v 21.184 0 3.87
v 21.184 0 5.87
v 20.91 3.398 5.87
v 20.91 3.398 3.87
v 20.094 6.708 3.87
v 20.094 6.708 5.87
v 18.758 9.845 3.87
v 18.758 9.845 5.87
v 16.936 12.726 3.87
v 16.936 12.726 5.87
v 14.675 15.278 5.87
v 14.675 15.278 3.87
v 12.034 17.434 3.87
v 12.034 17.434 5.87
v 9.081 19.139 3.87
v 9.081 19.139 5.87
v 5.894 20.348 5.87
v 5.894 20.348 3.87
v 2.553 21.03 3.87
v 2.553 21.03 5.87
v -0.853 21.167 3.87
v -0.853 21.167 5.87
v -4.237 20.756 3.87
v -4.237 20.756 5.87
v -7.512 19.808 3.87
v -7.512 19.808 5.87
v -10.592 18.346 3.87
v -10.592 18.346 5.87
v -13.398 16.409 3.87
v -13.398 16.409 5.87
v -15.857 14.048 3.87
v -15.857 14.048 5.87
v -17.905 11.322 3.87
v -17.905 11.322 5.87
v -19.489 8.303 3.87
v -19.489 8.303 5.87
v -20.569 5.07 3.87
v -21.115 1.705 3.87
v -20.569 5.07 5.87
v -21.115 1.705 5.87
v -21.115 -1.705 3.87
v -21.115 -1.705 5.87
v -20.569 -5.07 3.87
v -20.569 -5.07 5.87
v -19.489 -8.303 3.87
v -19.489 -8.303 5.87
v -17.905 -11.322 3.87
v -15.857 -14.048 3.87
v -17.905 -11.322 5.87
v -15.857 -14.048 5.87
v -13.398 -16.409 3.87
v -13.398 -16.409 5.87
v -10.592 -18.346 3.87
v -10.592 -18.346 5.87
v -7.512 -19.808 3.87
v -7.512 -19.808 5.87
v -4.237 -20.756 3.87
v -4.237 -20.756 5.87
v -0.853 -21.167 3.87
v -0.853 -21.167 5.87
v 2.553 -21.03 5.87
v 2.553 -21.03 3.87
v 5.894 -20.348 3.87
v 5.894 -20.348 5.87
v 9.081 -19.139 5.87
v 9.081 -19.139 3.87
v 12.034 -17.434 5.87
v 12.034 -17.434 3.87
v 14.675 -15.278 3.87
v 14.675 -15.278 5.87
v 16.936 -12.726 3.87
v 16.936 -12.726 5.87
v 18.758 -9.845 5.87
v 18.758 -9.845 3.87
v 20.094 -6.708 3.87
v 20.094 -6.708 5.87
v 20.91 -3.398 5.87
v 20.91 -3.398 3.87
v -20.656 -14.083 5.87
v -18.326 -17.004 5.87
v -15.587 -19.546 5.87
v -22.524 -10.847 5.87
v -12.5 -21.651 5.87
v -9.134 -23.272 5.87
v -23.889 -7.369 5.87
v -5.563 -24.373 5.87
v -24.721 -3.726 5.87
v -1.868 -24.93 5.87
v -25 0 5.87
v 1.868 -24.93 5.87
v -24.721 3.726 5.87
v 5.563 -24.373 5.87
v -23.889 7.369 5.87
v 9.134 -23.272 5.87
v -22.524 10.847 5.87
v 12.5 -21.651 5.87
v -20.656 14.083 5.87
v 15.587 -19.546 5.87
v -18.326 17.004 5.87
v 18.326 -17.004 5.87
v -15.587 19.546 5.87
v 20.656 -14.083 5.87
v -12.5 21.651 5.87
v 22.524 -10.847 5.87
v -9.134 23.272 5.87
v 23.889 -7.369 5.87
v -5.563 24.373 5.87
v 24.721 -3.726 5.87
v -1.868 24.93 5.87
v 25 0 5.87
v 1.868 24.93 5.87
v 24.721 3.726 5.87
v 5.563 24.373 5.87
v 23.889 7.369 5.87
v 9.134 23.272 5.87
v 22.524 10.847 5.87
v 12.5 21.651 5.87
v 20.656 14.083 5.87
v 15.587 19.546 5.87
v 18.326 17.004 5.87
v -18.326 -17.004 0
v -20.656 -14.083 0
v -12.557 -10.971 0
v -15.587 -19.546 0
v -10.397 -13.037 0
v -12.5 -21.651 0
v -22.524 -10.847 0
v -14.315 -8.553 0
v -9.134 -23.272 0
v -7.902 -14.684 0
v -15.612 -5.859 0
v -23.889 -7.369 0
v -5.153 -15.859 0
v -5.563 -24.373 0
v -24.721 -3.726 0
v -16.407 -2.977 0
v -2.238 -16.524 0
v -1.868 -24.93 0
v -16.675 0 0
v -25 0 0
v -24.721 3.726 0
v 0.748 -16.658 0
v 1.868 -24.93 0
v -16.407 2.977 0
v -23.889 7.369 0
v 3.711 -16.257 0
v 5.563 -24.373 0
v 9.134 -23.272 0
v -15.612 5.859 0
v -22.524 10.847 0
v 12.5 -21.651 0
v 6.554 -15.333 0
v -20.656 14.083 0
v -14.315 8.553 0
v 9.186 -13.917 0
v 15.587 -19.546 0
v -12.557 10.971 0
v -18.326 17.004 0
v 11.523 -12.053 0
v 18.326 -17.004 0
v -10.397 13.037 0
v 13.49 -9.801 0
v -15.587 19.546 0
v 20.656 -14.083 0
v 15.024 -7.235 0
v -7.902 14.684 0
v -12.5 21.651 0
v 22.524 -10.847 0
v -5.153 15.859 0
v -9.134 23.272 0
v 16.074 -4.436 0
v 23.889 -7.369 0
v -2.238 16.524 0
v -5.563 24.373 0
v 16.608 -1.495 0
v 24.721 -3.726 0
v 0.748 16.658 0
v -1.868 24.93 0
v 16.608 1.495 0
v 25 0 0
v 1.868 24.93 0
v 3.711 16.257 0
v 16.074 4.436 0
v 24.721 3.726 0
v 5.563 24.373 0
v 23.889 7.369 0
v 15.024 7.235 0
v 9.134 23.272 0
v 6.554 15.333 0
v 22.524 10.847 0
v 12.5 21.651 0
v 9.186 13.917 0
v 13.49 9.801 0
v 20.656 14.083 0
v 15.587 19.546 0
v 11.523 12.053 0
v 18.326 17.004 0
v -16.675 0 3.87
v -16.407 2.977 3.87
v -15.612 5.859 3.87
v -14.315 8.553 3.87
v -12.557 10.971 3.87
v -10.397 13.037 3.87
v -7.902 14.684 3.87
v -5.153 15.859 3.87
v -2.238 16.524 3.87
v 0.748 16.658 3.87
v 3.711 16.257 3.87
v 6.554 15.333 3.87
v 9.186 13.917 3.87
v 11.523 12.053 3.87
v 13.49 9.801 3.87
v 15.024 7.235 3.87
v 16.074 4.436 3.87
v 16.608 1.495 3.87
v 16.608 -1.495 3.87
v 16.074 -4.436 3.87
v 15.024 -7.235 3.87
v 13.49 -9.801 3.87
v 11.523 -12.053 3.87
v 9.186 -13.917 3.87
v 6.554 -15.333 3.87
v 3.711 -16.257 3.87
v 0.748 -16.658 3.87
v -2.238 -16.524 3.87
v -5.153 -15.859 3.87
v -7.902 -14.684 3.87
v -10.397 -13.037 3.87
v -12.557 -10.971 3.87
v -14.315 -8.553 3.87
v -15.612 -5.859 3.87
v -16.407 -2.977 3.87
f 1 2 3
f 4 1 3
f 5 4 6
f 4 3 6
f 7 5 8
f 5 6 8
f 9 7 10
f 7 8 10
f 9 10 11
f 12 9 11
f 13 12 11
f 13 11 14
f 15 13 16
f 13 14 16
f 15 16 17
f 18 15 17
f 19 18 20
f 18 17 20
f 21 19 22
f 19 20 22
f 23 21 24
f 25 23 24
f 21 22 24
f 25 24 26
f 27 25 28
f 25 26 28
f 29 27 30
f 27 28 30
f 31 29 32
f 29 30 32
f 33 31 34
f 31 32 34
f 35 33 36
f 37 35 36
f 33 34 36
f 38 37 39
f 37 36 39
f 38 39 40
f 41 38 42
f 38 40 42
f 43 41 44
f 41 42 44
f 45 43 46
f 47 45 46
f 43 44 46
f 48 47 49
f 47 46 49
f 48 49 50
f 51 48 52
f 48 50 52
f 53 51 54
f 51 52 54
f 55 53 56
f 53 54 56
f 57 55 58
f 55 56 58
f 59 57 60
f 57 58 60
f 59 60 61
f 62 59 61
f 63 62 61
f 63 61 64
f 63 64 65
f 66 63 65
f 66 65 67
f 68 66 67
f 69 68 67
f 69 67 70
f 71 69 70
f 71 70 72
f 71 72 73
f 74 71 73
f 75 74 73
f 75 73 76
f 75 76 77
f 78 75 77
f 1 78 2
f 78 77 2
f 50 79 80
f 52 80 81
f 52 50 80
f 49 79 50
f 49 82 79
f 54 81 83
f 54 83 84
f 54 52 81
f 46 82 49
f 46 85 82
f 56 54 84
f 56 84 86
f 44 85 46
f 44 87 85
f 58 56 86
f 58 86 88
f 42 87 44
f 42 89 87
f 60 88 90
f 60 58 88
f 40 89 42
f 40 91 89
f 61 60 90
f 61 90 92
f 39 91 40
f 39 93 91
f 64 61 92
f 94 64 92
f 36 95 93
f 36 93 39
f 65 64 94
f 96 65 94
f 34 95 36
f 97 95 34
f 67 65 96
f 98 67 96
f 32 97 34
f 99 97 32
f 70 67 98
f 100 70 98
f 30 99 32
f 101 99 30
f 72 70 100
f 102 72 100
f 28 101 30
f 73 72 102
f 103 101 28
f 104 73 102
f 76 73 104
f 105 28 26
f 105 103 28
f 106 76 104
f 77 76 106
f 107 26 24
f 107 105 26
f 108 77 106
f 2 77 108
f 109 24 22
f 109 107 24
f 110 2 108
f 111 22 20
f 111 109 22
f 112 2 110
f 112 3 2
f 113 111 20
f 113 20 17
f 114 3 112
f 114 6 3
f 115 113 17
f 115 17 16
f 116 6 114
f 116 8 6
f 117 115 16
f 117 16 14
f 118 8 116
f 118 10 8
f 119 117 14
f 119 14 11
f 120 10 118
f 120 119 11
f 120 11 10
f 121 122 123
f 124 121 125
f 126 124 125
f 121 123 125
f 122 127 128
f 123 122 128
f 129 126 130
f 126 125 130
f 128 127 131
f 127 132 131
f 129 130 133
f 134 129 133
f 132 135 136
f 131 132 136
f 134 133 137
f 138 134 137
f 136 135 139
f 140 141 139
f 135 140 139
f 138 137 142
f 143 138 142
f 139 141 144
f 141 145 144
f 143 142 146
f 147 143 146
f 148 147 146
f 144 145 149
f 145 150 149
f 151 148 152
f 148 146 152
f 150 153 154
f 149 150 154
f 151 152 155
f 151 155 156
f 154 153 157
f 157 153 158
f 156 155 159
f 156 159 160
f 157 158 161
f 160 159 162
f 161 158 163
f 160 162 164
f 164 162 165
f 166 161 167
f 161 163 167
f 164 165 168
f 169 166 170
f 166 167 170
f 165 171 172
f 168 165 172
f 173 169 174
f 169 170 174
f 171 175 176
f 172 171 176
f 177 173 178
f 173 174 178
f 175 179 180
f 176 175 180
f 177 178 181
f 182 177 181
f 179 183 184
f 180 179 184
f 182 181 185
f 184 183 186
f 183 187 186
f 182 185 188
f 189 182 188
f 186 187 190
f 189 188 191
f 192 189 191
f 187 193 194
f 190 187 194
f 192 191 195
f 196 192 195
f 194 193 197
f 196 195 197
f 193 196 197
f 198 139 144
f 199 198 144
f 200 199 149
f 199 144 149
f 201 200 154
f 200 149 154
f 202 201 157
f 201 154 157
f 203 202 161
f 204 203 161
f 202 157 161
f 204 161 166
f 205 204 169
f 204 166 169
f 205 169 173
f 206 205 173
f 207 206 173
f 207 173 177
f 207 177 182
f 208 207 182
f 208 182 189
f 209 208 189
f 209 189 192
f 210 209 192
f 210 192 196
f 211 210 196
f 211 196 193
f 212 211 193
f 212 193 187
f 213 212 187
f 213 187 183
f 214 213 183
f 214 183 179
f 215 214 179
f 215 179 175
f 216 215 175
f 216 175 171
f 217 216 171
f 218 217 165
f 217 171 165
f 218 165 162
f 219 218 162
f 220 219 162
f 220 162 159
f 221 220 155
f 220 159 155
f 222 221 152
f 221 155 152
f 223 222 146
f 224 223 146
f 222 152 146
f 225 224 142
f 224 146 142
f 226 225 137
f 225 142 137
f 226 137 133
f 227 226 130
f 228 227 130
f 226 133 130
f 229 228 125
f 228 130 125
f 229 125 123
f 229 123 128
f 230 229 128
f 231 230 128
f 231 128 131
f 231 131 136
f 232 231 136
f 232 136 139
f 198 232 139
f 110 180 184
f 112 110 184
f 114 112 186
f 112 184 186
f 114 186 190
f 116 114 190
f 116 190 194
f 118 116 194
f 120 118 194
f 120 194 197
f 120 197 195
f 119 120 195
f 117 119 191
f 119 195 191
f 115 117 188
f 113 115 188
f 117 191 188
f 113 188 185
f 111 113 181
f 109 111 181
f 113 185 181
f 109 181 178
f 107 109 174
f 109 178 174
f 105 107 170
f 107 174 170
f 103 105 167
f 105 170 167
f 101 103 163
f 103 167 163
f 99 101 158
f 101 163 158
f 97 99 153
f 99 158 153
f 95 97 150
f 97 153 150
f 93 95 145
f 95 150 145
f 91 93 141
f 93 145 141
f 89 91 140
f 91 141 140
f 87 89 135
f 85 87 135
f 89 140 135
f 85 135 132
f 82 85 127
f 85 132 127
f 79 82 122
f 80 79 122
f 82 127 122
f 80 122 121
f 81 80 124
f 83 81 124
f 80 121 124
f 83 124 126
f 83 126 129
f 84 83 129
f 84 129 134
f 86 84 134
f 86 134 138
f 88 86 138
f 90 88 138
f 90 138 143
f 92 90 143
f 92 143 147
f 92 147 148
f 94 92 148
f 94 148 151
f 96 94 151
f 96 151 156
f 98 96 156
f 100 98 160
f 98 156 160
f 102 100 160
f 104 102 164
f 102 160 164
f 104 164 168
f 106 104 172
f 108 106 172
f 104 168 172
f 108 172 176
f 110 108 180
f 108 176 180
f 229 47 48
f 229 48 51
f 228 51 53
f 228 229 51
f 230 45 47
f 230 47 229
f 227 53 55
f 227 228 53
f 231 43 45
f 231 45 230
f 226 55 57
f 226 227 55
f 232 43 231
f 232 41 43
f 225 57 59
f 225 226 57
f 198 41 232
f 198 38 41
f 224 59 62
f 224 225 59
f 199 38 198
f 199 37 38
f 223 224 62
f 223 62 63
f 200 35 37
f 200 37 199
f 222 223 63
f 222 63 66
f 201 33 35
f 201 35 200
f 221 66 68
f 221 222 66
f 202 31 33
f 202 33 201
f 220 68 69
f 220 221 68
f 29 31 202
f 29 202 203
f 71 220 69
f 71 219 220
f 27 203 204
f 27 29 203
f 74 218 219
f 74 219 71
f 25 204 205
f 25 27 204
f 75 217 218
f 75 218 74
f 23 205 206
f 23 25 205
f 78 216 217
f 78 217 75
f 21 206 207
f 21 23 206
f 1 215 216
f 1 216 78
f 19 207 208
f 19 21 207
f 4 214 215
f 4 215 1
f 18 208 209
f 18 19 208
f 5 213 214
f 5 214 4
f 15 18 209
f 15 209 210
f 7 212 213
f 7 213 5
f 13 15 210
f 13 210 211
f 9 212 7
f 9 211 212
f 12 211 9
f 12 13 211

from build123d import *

# Parameters (mm, degrees)
SKETCH1_R           = 25
BOSS_EXTRUDE1_DEPTH = 5.87
SKETCH2_R           = 16.675
CUT_EXTRUDE1_DEPTH  = 6.87
SKETCH3_R           = 21.184132597
CUT_EXTRUDE2_DEPTH  = 2


with BuildPart() as part:
    # Sketch1 → Boss-Extrude1 (new body)
    with BuildSketch(Plane.XY):
        Circle(SKETCH1_R)
    extrude(amount=BOSS_EXTRUDE1_DEPTH)

    # Sketch2 → Cut-Extrude1 (cut, through all)
    with BuildSketch(Plane(origin=(0, 0, 0), x_dir=(-1, 0, 0), z_dir=(0, 0, -1))):
        Circle(SKETCH2_R)
    extrude(amount=-CUT_EXTRUDE1_DEPTH, mode=Mode.SUBTRACT)

    # Sketch3 → Cut-Extrude2 (cut)
    with BuildSketch(Plane.XY.offset(5.87)):
        Circle(SKETCH3_R)
    extrude(amount=-CUT_EXTRUDE2_DEPTH, mode=Mode.SUBTRACT)


solid = part.part
